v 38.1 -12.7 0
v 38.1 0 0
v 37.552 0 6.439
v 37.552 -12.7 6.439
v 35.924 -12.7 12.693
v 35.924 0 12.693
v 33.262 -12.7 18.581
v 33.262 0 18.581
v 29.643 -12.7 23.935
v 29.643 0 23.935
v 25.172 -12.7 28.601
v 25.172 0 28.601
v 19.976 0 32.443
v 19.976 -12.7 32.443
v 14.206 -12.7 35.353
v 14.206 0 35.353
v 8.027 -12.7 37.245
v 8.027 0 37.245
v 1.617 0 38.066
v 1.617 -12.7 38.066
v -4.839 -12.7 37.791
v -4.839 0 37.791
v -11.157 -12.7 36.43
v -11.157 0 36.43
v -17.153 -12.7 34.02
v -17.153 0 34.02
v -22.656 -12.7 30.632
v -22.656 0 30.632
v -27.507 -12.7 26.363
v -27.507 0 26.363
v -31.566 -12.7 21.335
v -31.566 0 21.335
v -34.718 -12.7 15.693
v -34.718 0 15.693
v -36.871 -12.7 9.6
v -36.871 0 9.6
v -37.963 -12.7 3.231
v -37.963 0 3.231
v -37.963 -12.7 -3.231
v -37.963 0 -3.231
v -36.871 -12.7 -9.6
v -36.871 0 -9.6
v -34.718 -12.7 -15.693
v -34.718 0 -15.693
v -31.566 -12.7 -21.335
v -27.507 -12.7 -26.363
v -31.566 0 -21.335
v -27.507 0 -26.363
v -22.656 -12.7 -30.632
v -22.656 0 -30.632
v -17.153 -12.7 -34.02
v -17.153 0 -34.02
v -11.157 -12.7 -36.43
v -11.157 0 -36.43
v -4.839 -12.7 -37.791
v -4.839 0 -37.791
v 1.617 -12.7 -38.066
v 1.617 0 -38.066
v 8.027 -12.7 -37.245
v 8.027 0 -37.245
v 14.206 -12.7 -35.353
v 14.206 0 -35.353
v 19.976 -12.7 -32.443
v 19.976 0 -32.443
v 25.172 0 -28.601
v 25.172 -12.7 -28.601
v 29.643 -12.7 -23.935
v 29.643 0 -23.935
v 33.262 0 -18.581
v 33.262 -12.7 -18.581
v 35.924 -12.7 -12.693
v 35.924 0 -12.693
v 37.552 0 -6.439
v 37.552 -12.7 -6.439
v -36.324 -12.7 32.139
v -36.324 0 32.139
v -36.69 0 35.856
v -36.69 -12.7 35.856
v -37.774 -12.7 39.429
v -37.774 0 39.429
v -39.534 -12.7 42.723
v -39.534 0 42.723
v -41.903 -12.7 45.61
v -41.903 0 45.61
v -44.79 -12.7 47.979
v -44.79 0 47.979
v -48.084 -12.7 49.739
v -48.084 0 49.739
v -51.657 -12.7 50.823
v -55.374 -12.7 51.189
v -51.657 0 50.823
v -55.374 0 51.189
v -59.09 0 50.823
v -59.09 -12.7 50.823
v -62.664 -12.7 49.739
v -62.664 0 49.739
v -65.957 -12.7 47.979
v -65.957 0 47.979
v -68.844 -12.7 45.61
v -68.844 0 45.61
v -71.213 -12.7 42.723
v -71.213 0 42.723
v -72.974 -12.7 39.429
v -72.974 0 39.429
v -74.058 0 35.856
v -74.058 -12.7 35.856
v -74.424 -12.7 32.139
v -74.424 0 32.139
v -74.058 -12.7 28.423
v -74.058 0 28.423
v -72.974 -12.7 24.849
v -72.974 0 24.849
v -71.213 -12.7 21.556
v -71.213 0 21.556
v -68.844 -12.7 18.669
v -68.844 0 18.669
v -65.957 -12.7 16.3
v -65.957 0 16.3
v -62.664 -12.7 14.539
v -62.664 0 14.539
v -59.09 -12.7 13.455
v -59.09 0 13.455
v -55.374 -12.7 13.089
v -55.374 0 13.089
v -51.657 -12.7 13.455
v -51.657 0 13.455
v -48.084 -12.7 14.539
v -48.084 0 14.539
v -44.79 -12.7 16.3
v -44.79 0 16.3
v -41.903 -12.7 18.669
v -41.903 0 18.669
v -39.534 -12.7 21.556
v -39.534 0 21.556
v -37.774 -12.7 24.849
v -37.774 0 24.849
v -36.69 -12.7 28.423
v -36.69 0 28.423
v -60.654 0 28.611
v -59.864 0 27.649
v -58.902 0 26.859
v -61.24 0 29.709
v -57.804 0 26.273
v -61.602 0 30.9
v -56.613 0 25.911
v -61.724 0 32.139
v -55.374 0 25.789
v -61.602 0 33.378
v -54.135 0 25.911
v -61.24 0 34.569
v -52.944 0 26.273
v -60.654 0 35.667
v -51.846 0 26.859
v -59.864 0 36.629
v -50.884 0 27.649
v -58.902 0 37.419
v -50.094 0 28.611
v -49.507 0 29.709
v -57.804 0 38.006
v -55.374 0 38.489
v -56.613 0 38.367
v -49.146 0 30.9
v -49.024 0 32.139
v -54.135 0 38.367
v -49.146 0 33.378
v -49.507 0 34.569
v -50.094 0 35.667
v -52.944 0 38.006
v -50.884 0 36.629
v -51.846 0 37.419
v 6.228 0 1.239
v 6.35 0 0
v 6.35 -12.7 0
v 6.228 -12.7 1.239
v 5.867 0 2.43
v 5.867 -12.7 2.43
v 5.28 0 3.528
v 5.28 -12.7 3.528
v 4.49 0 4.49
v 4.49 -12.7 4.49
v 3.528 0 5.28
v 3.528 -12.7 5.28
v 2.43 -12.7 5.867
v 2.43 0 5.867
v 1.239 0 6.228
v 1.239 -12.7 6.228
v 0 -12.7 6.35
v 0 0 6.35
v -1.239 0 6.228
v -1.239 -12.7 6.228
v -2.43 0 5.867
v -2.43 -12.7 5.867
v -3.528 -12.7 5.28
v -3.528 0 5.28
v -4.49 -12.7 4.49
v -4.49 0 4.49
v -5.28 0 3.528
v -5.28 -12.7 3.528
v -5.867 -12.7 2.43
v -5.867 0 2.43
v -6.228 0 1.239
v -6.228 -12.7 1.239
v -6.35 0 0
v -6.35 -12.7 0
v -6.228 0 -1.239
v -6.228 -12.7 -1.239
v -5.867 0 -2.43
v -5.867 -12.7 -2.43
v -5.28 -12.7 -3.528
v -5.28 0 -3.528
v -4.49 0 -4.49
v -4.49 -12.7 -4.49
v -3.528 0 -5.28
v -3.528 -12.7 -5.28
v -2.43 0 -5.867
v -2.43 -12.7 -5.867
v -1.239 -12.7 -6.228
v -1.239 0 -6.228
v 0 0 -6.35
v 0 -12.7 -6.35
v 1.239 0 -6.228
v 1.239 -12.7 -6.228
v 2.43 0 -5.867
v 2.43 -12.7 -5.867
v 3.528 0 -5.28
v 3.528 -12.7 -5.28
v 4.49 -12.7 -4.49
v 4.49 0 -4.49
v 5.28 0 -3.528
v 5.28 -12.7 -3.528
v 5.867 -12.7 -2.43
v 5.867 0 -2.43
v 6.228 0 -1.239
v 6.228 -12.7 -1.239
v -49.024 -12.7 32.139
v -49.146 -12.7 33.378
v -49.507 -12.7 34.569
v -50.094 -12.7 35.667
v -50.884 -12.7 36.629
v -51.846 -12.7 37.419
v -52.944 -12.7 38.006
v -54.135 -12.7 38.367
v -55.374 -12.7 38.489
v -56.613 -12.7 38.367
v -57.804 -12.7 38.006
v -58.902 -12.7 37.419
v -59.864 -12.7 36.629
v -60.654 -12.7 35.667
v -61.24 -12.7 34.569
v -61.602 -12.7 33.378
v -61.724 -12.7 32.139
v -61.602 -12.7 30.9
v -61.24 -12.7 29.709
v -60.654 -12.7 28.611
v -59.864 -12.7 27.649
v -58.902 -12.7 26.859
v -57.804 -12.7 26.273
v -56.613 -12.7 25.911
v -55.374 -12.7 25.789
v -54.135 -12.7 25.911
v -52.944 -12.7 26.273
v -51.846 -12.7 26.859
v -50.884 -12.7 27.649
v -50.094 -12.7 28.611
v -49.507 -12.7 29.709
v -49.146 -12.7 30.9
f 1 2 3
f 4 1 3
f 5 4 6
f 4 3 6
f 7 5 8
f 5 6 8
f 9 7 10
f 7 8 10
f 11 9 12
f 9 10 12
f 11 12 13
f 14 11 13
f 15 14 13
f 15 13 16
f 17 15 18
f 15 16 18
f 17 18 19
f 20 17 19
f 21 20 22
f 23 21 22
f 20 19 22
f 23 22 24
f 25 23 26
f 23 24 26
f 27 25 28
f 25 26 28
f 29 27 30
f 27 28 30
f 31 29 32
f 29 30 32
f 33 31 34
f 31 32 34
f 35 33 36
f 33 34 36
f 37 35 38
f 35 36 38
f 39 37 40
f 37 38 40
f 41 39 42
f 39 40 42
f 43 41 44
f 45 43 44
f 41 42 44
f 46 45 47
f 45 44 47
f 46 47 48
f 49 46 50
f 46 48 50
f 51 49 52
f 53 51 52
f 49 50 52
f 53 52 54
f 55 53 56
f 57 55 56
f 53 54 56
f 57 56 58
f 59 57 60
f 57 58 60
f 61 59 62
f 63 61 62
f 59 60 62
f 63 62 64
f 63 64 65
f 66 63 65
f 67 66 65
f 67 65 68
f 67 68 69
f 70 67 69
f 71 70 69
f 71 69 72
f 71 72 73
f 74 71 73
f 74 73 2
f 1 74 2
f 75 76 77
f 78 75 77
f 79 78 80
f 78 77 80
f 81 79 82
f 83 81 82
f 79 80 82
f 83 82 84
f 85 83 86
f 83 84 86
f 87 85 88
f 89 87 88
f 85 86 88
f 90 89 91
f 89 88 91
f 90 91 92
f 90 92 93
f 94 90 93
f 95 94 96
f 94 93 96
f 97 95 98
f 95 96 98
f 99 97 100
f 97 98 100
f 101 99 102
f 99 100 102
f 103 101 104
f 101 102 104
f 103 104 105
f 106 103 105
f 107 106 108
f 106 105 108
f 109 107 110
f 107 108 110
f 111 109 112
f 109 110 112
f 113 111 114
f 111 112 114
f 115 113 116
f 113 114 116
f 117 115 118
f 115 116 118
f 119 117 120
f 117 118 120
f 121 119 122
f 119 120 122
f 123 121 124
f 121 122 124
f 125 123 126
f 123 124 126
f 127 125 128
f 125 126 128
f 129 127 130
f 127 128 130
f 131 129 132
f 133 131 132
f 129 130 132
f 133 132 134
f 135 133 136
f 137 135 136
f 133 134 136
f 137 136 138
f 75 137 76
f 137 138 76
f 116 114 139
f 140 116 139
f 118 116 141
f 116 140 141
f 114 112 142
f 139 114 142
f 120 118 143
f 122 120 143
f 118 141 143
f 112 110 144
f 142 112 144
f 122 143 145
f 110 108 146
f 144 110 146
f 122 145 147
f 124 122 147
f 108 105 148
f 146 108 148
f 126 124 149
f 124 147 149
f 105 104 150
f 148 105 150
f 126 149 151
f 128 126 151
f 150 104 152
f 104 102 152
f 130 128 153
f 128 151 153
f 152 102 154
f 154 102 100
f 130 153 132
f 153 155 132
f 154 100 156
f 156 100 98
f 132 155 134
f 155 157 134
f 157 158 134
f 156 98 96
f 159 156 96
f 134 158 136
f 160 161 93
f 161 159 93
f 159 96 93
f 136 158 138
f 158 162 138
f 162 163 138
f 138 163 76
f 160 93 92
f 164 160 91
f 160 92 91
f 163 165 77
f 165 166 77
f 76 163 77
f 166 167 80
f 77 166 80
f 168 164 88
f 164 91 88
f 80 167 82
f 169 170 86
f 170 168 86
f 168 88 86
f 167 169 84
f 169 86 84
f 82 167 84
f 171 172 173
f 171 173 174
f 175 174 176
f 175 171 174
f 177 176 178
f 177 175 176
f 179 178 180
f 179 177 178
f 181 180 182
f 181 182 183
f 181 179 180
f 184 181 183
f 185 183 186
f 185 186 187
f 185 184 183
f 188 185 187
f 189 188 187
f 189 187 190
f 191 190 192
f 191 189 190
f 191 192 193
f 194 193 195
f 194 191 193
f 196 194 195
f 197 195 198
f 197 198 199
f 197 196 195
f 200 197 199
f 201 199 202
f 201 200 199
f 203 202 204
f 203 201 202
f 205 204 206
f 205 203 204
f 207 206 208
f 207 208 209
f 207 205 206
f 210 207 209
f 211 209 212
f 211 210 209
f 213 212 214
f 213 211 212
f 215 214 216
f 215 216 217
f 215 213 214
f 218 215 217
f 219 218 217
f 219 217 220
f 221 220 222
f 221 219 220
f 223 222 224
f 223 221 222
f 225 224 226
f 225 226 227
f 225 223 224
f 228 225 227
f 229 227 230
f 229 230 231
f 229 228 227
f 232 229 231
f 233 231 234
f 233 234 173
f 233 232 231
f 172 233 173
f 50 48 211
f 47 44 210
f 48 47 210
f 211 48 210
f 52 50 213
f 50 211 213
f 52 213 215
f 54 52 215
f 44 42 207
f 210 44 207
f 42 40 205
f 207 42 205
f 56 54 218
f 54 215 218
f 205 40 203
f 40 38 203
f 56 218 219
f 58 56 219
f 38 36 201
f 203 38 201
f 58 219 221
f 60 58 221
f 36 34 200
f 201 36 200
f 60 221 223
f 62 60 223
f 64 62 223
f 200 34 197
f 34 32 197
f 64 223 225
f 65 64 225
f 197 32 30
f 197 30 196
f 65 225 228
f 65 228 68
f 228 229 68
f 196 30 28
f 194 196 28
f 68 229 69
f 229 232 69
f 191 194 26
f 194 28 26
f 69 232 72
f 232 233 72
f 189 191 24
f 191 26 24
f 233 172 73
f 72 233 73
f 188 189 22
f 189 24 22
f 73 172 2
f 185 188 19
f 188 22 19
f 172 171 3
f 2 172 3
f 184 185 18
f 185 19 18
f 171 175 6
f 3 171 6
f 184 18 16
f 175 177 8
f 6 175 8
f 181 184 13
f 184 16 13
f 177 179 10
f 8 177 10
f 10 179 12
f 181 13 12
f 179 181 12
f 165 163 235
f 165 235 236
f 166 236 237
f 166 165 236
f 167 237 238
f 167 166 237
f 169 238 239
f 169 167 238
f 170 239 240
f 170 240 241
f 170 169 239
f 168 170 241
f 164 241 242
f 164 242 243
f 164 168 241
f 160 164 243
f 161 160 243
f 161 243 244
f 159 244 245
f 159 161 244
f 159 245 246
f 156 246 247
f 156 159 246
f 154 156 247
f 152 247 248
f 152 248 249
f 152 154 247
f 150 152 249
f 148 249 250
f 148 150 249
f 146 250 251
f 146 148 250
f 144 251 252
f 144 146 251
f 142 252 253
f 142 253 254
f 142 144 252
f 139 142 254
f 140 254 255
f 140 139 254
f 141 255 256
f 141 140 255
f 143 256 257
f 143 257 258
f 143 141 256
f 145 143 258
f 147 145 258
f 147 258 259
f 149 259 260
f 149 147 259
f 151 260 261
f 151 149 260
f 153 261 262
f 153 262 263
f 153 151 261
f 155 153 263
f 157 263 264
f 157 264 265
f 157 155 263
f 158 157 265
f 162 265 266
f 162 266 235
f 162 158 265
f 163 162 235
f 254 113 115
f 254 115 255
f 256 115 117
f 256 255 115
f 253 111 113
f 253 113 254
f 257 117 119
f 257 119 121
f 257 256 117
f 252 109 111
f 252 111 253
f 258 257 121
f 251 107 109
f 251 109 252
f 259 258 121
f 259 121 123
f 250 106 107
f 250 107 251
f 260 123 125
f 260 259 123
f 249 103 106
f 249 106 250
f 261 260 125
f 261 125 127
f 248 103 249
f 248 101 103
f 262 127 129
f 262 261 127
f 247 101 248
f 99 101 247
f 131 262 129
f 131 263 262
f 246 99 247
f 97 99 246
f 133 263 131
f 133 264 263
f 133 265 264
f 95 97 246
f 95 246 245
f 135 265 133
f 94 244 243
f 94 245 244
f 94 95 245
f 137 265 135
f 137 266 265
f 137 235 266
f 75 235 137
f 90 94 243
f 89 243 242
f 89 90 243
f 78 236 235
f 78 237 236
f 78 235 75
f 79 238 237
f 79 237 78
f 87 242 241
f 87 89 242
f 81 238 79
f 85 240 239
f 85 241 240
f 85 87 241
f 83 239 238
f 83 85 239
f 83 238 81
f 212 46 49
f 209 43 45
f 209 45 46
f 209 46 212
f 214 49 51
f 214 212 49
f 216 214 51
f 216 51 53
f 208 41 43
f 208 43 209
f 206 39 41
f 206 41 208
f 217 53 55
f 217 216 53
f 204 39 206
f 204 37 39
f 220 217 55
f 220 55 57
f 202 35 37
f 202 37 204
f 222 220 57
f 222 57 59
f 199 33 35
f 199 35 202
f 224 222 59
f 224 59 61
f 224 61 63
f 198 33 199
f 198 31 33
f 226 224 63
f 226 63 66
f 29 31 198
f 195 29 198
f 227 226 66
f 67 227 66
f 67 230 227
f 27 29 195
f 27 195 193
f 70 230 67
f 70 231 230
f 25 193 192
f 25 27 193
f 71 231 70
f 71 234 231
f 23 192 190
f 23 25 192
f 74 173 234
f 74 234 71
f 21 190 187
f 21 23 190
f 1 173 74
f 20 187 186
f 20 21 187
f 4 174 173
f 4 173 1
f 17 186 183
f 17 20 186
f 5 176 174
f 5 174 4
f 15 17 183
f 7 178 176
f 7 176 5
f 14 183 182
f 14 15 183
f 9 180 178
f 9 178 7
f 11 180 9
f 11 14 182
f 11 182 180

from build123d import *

# Parameters (mm, degrees)
F0_R     = 19.05
F0_R_2   = 6.35
F0_R_3   = 38.1
F1_DEPTH = 12.7


with BuildPart() as f1:
    # F0 (on Front) → F1 (new body)
    with BuildSketch(Plane.XZ):
        with Locations((-55.37371, 32.139193)):
            Circle(F0_R)
        with Locations((-55.37371, 32.139193)):
            Circle(F0_R_2, mode=Mode.SUBTRACT)
        Circle(F0_R_3)
        Circle(F0_R_2, mode=Mode.SUBTRACT)
    extrude(amount=F1_DEPTH)


solid = f1.part
